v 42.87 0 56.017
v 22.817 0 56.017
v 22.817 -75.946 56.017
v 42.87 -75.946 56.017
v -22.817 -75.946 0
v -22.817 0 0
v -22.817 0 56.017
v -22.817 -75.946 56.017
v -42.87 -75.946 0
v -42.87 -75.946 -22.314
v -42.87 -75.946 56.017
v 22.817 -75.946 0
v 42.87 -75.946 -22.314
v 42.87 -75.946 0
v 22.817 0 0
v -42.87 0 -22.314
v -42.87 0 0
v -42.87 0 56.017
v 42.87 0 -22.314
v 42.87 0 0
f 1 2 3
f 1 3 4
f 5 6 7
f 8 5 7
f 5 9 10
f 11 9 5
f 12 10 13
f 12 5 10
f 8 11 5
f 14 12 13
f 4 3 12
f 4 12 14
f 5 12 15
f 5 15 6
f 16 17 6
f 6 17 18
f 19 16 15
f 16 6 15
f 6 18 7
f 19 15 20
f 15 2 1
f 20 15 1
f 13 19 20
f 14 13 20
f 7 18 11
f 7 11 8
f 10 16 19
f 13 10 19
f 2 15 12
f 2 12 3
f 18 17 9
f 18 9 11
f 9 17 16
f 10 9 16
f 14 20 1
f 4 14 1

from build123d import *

# Parameters (mm, degrees)
F0_W     = 20.052685
F0_H     = 56.016997
F1_DEPTH = 75.946


with BuildPart() as f1:
    # F0 (on Front) → F1 (new body)
    with BuildSketch(Plane.XZ):
        Polygon((22.817267, 0), (0, 0), (0, -22.313809), (42.869952, -22.313809), (42.869952, 0), align=None)
        Polygon((0, -22.313809), (0, 0), (-22.817267, 0), (-42.869952, 0), (-42.869952, -22.313809), align=None)
        with Locations((32.843609, 28.008498)):
            Rectangle(F0_W, F0_H)
        with Locations((-32.843609, 28.008498)):
            Rectangle(F0_W, F0_H)
    extrude(amount=F1_DEPTH)


solid = f1.part
